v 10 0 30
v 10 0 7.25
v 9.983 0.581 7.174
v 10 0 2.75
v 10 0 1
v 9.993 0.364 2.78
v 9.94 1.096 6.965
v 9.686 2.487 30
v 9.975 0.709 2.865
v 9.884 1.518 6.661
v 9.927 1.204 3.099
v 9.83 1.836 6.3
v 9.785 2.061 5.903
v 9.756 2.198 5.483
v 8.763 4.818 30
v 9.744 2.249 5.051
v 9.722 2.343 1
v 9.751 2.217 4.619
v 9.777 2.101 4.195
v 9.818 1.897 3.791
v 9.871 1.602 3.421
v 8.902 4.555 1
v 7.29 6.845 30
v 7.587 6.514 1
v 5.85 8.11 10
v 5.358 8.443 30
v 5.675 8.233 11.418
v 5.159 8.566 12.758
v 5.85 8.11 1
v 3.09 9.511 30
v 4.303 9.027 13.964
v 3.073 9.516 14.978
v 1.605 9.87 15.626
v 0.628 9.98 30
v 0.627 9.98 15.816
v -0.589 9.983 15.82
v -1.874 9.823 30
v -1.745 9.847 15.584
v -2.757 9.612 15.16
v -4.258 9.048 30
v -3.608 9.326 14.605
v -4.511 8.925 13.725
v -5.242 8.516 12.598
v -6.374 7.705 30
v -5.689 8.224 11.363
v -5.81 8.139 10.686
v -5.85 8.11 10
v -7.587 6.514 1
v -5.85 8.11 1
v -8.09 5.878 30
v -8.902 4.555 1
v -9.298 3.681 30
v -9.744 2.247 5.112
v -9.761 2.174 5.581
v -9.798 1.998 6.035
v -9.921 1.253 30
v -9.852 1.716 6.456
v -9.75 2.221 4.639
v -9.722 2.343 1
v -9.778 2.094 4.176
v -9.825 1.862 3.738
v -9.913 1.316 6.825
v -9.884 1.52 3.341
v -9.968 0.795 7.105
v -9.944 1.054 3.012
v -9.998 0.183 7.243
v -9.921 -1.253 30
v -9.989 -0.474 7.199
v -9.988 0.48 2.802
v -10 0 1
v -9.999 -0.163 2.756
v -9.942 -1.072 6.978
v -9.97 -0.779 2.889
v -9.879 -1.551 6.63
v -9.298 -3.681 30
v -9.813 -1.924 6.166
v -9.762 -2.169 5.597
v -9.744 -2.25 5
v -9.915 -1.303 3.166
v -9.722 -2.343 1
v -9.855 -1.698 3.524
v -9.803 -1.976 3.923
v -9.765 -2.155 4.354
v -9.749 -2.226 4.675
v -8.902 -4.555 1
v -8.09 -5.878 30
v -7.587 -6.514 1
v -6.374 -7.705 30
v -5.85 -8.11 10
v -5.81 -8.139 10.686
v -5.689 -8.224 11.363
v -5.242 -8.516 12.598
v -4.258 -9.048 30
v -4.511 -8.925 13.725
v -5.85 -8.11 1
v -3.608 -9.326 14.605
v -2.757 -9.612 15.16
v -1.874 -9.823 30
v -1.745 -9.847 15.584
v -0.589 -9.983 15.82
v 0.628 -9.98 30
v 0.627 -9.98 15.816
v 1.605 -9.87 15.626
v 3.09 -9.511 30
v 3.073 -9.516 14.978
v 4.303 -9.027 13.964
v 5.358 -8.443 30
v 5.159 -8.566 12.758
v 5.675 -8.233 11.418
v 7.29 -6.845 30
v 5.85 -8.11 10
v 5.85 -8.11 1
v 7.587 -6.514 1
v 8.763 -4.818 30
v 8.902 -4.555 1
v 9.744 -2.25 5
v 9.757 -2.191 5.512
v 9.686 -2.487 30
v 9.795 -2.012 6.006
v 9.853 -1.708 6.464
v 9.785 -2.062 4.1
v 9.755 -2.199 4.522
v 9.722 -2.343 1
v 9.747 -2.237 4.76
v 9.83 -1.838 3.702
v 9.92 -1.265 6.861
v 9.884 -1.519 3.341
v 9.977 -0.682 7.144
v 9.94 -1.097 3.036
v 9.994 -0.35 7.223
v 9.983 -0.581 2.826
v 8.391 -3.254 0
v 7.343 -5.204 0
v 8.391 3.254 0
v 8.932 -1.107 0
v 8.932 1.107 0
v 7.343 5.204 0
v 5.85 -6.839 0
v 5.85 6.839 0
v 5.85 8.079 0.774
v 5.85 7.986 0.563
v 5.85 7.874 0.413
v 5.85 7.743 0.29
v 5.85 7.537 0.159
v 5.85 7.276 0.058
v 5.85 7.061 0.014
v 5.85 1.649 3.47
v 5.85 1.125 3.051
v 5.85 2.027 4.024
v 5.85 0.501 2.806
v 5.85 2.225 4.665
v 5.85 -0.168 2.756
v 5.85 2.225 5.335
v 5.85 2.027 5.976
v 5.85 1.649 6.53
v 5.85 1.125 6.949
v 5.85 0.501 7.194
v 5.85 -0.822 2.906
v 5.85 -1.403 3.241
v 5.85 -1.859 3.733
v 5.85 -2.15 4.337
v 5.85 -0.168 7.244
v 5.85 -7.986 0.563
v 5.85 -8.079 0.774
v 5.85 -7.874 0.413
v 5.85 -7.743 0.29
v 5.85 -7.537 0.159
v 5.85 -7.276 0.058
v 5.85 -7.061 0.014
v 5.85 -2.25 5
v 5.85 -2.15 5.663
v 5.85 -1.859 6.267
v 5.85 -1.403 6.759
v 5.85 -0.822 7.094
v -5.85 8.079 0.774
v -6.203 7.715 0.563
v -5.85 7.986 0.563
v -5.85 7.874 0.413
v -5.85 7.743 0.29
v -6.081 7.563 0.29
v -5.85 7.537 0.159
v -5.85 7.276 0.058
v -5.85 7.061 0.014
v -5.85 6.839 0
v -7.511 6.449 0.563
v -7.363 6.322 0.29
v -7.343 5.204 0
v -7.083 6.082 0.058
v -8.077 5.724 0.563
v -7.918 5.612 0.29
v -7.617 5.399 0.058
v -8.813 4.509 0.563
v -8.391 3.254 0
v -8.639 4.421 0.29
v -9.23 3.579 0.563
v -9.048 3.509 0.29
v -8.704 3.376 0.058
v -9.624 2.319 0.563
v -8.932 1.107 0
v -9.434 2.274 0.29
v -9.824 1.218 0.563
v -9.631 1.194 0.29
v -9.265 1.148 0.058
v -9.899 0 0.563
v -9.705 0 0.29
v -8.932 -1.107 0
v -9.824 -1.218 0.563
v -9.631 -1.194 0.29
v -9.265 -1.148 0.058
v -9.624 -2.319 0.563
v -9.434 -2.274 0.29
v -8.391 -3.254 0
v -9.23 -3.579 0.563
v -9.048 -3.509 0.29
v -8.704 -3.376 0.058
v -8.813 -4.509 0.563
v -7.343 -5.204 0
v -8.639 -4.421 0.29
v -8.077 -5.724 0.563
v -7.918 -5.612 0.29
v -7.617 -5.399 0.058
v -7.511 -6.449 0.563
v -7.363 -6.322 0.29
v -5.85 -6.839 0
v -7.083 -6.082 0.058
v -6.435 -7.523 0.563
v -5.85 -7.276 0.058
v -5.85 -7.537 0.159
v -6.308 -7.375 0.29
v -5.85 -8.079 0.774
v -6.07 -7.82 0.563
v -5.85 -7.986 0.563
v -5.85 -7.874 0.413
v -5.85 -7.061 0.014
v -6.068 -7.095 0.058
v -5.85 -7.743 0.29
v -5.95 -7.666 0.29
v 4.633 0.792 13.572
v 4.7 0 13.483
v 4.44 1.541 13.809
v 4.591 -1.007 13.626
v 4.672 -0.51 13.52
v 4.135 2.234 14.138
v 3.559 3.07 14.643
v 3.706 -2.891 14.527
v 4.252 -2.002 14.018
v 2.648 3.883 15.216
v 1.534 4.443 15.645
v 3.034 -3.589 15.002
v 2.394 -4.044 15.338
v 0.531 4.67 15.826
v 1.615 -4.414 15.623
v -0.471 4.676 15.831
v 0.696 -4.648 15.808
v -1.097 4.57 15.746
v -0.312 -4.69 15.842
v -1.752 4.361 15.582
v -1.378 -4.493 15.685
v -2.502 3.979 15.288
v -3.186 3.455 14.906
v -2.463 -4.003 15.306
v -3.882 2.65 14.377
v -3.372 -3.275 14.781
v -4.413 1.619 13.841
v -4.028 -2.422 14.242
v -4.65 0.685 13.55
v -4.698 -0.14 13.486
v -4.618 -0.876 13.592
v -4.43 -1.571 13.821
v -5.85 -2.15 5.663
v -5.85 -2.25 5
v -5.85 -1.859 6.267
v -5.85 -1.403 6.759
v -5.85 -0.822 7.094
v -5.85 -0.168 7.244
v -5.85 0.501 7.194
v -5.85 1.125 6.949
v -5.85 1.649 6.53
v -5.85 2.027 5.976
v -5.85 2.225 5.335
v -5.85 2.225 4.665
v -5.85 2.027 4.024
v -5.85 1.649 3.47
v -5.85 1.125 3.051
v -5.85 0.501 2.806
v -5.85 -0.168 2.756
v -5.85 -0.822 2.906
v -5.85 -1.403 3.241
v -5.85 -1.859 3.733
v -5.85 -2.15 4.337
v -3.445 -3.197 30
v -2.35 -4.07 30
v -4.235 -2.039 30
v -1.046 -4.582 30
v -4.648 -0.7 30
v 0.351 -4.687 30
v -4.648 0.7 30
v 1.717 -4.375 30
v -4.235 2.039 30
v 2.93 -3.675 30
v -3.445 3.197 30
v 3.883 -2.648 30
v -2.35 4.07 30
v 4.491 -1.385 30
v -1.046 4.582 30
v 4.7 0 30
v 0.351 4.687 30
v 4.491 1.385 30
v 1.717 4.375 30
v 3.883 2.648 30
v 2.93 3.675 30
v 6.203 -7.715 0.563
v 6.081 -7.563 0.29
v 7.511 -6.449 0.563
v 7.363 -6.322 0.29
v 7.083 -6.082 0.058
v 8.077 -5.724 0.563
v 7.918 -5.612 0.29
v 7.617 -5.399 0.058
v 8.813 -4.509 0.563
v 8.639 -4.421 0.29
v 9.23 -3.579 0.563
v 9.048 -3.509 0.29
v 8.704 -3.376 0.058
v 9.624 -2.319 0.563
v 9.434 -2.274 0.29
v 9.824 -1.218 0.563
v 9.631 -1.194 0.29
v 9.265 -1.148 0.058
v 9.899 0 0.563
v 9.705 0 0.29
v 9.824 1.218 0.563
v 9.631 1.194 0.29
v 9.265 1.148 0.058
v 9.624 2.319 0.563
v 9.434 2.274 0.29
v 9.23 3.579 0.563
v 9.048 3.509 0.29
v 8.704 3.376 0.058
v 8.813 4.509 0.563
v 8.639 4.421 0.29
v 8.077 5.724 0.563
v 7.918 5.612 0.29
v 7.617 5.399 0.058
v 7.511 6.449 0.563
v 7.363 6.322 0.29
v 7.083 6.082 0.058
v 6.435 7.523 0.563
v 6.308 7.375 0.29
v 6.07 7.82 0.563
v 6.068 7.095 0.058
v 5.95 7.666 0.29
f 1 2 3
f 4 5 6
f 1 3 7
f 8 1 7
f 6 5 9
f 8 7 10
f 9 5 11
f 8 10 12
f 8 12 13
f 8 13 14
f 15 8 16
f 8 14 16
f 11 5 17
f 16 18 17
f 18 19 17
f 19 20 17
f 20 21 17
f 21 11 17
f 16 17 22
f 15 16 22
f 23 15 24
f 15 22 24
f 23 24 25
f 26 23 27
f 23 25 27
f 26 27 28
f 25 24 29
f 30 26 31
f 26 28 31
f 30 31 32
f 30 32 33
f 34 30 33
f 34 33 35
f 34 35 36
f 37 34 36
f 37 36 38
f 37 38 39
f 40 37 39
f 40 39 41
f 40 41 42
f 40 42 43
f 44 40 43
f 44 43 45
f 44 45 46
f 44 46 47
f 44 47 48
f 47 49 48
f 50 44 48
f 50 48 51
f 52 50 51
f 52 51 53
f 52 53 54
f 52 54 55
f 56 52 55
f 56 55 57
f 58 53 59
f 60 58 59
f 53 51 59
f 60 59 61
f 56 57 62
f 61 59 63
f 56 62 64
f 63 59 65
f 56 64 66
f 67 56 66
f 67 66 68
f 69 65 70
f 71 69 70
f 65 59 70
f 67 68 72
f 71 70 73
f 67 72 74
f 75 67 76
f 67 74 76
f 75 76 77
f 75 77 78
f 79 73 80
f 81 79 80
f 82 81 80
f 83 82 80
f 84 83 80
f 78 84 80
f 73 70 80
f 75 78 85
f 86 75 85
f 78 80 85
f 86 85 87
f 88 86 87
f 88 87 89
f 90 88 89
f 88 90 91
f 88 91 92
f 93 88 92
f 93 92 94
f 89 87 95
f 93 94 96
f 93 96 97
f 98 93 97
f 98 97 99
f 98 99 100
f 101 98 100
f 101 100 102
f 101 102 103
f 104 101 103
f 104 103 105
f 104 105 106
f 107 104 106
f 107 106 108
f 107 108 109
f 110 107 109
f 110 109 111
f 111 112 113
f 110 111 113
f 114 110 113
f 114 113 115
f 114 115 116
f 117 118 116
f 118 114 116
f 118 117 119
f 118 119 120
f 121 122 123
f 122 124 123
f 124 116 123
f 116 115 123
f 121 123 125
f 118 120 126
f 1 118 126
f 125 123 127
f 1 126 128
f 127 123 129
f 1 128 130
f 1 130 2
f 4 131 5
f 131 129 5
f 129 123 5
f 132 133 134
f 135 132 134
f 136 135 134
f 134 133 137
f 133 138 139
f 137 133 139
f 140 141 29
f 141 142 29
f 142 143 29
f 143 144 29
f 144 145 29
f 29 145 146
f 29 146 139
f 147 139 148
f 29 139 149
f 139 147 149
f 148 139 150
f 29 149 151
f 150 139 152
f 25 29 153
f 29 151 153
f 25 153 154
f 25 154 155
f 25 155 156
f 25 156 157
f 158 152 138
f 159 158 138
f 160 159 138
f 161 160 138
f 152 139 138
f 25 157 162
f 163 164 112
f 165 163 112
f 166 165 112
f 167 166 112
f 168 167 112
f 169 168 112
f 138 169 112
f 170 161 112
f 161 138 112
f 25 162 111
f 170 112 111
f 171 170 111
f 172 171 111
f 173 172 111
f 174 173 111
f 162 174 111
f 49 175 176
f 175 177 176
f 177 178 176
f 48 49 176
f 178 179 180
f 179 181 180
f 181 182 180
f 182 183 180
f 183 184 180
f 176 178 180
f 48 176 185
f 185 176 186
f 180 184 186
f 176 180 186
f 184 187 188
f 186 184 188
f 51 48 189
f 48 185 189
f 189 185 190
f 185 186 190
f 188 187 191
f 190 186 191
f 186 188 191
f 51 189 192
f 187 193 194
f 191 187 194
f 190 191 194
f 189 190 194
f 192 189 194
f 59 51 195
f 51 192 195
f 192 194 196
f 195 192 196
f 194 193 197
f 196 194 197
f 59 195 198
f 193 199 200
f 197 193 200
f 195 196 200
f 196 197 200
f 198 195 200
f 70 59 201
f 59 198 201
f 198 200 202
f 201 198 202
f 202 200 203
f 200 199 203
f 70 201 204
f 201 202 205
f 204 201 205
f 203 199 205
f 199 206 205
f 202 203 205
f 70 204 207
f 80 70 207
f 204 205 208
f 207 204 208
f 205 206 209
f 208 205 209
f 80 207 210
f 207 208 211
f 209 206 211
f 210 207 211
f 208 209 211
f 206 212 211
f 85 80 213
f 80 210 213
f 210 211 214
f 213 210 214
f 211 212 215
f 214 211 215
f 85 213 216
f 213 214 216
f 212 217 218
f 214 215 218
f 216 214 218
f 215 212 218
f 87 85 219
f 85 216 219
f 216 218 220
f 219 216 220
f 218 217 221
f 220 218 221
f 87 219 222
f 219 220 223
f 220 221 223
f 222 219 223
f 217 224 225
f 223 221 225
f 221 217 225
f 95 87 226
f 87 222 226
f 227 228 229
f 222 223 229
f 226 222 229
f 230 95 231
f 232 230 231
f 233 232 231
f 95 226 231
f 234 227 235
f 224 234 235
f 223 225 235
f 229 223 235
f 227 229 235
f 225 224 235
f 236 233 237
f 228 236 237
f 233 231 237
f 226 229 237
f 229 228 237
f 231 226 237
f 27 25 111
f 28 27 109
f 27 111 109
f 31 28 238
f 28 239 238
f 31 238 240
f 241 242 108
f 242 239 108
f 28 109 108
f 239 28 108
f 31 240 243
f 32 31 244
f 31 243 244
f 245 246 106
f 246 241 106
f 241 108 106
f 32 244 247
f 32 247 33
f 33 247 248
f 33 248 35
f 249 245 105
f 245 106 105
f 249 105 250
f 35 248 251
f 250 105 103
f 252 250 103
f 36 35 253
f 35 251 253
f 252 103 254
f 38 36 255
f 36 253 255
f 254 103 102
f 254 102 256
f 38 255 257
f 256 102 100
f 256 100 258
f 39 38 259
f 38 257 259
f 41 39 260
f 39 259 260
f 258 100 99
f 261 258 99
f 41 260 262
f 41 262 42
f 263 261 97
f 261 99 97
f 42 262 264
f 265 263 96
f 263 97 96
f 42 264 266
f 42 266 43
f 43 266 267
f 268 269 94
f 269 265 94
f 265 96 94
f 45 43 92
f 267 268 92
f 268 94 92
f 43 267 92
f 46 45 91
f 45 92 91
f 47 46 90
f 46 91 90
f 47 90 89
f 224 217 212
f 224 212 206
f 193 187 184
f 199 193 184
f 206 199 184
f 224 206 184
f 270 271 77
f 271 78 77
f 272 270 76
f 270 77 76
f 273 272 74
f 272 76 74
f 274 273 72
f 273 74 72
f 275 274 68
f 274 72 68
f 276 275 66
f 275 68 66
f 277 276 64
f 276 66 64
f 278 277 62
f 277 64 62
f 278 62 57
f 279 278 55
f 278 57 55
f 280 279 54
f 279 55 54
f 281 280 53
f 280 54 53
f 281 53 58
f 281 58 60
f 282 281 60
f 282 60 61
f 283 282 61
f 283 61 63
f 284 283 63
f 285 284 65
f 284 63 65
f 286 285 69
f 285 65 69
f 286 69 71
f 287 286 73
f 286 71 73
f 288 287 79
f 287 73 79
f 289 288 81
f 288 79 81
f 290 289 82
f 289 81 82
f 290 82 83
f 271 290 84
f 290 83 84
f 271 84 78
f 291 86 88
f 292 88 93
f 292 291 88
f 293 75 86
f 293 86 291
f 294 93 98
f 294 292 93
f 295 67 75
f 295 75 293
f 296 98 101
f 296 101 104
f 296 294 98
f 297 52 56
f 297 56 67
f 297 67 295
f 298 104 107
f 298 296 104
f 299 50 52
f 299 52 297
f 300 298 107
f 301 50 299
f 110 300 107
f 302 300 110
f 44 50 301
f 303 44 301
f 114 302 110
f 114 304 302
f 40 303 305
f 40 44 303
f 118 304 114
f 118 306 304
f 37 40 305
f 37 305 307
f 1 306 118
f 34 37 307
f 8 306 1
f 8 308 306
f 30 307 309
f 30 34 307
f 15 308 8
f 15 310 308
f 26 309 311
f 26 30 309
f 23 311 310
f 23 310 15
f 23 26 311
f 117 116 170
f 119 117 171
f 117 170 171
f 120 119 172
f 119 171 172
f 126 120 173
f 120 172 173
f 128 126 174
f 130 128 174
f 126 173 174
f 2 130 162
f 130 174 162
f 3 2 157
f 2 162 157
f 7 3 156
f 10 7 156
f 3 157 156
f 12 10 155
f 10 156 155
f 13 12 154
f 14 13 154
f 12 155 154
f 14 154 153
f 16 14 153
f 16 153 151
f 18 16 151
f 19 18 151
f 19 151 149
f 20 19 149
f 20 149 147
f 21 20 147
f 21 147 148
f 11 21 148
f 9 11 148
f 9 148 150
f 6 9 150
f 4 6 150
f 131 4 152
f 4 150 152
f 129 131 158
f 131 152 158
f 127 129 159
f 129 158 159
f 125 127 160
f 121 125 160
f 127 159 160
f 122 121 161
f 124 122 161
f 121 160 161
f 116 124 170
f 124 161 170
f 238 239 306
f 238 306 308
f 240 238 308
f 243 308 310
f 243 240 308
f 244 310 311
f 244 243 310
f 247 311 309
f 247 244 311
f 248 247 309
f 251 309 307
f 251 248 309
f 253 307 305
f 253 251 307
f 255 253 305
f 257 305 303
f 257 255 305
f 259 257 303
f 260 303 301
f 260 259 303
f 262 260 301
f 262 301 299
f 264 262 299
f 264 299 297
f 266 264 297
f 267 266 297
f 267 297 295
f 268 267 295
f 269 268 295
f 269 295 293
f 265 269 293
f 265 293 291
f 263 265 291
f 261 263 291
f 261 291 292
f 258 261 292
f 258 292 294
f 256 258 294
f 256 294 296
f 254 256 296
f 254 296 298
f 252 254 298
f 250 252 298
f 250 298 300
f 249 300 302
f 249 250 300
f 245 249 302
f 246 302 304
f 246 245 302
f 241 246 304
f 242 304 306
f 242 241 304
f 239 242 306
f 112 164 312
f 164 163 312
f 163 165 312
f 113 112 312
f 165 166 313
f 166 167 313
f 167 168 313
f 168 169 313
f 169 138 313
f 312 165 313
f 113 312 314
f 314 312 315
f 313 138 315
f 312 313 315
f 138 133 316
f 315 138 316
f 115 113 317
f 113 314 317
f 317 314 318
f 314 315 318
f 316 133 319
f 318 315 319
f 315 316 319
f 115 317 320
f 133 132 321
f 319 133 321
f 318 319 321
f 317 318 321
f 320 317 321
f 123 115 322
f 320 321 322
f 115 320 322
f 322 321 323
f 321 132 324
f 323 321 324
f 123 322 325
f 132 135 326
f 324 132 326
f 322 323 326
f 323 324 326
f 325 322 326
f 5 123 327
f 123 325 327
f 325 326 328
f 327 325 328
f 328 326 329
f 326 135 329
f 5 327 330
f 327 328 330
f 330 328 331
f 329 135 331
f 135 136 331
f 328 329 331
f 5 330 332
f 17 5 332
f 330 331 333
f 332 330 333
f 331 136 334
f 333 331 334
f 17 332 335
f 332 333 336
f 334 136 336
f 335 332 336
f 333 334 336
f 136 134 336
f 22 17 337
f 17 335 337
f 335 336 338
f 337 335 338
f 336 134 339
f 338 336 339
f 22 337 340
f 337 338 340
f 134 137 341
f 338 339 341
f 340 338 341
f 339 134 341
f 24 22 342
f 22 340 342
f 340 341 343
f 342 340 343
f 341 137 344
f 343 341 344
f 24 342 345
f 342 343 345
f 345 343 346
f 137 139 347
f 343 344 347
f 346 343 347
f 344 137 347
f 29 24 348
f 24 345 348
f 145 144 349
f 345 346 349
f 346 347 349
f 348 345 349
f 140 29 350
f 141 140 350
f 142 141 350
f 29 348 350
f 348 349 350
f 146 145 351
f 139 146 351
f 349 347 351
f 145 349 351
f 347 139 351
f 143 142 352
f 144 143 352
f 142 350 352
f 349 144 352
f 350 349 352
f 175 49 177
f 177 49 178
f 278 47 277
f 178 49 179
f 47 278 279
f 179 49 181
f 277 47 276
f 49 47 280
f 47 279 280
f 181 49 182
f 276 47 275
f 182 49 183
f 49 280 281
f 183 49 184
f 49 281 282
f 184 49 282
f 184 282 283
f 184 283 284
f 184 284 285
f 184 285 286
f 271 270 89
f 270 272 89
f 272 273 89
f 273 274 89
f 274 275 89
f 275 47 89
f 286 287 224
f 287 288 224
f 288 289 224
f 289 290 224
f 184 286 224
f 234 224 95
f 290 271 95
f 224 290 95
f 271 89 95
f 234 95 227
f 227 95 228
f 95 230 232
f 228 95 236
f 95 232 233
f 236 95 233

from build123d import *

# Parameters (mm, degrees)
SKETCH_R        = 10
SKETCH_R_2      = 4.7
PAD_DEPTH       = 30
SKETCH001_R     = 5.85
POCKET_DEPTH    = 10
POCKET001_DEPTH = 11
SKETCH003_R     = 2.25
POCKET002_DEPTH = 13
FILLET_R        = 1


with BuildPart() as part:
    # Sketch → Pad (new body)
    with BuildSketch(Plane.XY):
        Circle(SKETCH_R)
        Circle(SKETCH_R_2, mode=Mode.SUBTRACT)
    extrude(amount=PAD_DEPTH)

    # Sketch001 → Pocket (cut)
    with BuildSketch(Plane.XY):
        Circle(SKETCH001_R)
    extrude(amount=POCKET_DEPTH, mode=Mode.SUBTRACT)

    # Sketch002 → Pocket001 (cut, symmetric)
    with BuildSketch(Plane.XZ):
        with BuildLine():
            ThreePointArc((5.85, 10), (0, 15.85), (-5.85, 10))
            Line((-5.85, 10), (-5.85, 0))
            Line((-5.85, 0), (5.85, 0))
            Line((5.85, 0), (5.85, 10))
        make_face()
    extrude(amount=POCKET001_DEPTH, both=True, mode=Mode.SUBTRACT)

    # Sketch003 (on DatumPlane) → Pocket002 (cut, symmetric)
    with BuildSketch(Plane(origin=(0, 0, 0), x_dir=(0, -1, 0), z_dir=(-1, 0, 0))):
        with Locations((0, 5)):
            Circle(SKETCH003_R)
    extrude(amount=POCKET002_DEPTH, both=True, mode=Mode.SUBTRACT)

    # Fillet
    fillet_edges = [part.edges().sort_by_distance(p)[0] for p in [
        (-10, 0, 0),
        (8.902247, 4.555217, 0),
        (8.902247, -4.555217, 0),
    ]]
    fillet(fillet_edges, radius=FILLET_R)


solid = part.part
